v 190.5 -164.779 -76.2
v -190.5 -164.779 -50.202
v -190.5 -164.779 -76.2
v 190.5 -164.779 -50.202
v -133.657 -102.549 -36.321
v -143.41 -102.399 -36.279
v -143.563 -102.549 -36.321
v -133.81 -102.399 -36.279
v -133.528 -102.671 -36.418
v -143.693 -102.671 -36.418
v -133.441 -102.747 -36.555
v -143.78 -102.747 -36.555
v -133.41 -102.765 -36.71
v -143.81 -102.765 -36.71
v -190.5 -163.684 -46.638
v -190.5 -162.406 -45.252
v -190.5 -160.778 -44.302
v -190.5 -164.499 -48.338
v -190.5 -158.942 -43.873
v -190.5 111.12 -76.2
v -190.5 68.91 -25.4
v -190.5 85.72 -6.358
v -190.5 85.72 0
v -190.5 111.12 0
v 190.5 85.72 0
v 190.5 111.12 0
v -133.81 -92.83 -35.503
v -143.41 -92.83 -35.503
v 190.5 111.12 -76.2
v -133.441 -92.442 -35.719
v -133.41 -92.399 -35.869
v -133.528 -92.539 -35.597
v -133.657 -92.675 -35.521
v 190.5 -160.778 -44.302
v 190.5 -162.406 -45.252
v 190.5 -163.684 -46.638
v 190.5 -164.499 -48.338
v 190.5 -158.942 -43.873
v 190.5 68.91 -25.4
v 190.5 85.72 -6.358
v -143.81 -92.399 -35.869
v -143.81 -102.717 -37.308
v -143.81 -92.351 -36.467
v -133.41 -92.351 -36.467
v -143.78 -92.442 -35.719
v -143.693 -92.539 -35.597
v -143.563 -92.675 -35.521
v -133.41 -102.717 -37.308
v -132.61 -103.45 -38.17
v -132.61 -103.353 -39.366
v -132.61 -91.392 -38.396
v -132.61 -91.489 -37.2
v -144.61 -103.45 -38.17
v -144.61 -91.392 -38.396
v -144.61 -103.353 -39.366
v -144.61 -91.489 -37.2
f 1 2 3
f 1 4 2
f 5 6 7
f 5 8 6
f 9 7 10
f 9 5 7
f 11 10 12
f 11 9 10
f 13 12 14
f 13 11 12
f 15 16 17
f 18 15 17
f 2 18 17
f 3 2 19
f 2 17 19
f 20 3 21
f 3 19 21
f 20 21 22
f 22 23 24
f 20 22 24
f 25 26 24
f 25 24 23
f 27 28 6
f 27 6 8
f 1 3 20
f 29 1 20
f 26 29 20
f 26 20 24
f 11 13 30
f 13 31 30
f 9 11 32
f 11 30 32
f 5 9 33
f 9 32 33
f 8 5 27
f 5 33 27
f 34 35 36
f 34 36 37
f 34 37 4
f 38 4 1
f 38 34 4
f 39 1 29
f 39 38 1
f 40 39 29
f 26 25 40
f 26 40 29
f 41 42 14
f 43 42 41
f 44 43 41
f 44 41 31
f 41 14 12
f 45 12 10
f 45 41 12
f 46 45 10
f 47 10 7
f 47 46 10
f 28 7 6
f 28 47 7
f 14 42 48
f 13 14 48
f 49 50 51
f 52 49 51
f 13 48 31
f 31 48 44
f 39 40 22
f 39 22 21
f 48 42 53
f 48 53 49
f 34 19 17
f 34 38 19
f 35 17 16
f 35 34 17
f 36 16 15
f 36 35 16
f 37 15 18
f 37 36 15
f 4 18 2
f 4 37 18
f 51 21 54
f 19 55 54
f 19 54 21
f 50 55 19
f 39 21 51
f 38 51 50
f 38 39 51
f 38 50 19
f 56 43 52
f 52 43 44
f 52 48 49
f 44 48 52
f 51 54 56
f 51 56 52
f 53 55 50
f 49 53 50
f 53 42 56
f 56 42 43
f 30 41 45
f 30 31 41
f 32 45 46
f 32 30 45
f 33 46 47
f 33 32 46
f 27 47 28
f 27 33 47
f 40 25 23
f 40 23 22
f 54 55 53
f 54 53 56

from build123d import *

# Parameters (mm, degrees)
F1_DEPTH = 190.5
F2_W     = 12
F2_H     = 12
F3_DEPTH = 2
F4_SIZE  = 0.8
F5_DEPTH = 1
F6_R     = 0.4


with BuildPart() as f1:
    # F0 (on Right) → F1 (new body, symmetric)
    with BuildSketch(Plane.YZ):
        with BuildLine():
            Line((-164.7787988186, -76.2), (111.1195152746, -76.2))
            Line((111.1195152746, -76.2), (111.1195152746, 0))
            Line((111.1195152746, 0), (85.7195152746, 0))
            Line((85.7195152746, 0), (85.7195152746, -6.3575065629))
            Line((85.7195152746, -6.3575065629), (68.9104866383, -25.4))
            Line((68.9104866383, -25.4), (-158.9419270625, -43.8726167807))
            ThreePointArc((-158.9419270625, -43.8726167807), (-163.0968211166, -45.8969616661), (-164.7787988186, -50.2018504946))
            Line((-164.7787988186, -50.2018504946), (-164.7787988186, -76.2))
        make_face()
    extrude(amount=F1_DEPTH, both=True)

    # F2 (on face) → F3 (join)
    with BuildSketch(Plane(origin=(0, 2.4957770492, -30.7844216917), x_dir=(1, 0, 0), z_dir=(0, -0.0808075975, 0.9967297187))):
        with Locations((-138.6103741825, -100.1955993752)):
            Rectangle(F2_W, F2_H)
    extrude(amount=F3_DEPTH)

    # F4
    f4_edges = [f1.edges().sort_by_distance(p)[0] for p in [
        (-138.610374, -91.553391, -36.402682),
        (-144.610374, -97.53377, -36.887528),
        (-138.610374, -103.514148, -37.372374),
        (-132.610374, -97.53377, -36.887528),
    ]]
    chamfer(f4_edges, length=F4_SIZE)

    # F5 (add): a face of the model
    f5_faces = [f1.faces().sort_by_distance(p)[0] for p in [
        (-138.6103741825, -97.5337697285, -36.8875279164),
    ]]
    extrude(f5_faces, amount=F5_DEPTH)

    # F6
    f6_edges = [f1.edges().sort_by_distance(p)[0] for p in [
        (-138.610374, -92.431583, -35.470599),
        (-133.410374, -97.614577, -35.890798),
        (-143.810374, -97.614577, -35.890798),
        (-138.610374, -102.797572, -36.310998),
    ]]
    fillet(f6_edges, radius=F6_R)


solid = f1.part
